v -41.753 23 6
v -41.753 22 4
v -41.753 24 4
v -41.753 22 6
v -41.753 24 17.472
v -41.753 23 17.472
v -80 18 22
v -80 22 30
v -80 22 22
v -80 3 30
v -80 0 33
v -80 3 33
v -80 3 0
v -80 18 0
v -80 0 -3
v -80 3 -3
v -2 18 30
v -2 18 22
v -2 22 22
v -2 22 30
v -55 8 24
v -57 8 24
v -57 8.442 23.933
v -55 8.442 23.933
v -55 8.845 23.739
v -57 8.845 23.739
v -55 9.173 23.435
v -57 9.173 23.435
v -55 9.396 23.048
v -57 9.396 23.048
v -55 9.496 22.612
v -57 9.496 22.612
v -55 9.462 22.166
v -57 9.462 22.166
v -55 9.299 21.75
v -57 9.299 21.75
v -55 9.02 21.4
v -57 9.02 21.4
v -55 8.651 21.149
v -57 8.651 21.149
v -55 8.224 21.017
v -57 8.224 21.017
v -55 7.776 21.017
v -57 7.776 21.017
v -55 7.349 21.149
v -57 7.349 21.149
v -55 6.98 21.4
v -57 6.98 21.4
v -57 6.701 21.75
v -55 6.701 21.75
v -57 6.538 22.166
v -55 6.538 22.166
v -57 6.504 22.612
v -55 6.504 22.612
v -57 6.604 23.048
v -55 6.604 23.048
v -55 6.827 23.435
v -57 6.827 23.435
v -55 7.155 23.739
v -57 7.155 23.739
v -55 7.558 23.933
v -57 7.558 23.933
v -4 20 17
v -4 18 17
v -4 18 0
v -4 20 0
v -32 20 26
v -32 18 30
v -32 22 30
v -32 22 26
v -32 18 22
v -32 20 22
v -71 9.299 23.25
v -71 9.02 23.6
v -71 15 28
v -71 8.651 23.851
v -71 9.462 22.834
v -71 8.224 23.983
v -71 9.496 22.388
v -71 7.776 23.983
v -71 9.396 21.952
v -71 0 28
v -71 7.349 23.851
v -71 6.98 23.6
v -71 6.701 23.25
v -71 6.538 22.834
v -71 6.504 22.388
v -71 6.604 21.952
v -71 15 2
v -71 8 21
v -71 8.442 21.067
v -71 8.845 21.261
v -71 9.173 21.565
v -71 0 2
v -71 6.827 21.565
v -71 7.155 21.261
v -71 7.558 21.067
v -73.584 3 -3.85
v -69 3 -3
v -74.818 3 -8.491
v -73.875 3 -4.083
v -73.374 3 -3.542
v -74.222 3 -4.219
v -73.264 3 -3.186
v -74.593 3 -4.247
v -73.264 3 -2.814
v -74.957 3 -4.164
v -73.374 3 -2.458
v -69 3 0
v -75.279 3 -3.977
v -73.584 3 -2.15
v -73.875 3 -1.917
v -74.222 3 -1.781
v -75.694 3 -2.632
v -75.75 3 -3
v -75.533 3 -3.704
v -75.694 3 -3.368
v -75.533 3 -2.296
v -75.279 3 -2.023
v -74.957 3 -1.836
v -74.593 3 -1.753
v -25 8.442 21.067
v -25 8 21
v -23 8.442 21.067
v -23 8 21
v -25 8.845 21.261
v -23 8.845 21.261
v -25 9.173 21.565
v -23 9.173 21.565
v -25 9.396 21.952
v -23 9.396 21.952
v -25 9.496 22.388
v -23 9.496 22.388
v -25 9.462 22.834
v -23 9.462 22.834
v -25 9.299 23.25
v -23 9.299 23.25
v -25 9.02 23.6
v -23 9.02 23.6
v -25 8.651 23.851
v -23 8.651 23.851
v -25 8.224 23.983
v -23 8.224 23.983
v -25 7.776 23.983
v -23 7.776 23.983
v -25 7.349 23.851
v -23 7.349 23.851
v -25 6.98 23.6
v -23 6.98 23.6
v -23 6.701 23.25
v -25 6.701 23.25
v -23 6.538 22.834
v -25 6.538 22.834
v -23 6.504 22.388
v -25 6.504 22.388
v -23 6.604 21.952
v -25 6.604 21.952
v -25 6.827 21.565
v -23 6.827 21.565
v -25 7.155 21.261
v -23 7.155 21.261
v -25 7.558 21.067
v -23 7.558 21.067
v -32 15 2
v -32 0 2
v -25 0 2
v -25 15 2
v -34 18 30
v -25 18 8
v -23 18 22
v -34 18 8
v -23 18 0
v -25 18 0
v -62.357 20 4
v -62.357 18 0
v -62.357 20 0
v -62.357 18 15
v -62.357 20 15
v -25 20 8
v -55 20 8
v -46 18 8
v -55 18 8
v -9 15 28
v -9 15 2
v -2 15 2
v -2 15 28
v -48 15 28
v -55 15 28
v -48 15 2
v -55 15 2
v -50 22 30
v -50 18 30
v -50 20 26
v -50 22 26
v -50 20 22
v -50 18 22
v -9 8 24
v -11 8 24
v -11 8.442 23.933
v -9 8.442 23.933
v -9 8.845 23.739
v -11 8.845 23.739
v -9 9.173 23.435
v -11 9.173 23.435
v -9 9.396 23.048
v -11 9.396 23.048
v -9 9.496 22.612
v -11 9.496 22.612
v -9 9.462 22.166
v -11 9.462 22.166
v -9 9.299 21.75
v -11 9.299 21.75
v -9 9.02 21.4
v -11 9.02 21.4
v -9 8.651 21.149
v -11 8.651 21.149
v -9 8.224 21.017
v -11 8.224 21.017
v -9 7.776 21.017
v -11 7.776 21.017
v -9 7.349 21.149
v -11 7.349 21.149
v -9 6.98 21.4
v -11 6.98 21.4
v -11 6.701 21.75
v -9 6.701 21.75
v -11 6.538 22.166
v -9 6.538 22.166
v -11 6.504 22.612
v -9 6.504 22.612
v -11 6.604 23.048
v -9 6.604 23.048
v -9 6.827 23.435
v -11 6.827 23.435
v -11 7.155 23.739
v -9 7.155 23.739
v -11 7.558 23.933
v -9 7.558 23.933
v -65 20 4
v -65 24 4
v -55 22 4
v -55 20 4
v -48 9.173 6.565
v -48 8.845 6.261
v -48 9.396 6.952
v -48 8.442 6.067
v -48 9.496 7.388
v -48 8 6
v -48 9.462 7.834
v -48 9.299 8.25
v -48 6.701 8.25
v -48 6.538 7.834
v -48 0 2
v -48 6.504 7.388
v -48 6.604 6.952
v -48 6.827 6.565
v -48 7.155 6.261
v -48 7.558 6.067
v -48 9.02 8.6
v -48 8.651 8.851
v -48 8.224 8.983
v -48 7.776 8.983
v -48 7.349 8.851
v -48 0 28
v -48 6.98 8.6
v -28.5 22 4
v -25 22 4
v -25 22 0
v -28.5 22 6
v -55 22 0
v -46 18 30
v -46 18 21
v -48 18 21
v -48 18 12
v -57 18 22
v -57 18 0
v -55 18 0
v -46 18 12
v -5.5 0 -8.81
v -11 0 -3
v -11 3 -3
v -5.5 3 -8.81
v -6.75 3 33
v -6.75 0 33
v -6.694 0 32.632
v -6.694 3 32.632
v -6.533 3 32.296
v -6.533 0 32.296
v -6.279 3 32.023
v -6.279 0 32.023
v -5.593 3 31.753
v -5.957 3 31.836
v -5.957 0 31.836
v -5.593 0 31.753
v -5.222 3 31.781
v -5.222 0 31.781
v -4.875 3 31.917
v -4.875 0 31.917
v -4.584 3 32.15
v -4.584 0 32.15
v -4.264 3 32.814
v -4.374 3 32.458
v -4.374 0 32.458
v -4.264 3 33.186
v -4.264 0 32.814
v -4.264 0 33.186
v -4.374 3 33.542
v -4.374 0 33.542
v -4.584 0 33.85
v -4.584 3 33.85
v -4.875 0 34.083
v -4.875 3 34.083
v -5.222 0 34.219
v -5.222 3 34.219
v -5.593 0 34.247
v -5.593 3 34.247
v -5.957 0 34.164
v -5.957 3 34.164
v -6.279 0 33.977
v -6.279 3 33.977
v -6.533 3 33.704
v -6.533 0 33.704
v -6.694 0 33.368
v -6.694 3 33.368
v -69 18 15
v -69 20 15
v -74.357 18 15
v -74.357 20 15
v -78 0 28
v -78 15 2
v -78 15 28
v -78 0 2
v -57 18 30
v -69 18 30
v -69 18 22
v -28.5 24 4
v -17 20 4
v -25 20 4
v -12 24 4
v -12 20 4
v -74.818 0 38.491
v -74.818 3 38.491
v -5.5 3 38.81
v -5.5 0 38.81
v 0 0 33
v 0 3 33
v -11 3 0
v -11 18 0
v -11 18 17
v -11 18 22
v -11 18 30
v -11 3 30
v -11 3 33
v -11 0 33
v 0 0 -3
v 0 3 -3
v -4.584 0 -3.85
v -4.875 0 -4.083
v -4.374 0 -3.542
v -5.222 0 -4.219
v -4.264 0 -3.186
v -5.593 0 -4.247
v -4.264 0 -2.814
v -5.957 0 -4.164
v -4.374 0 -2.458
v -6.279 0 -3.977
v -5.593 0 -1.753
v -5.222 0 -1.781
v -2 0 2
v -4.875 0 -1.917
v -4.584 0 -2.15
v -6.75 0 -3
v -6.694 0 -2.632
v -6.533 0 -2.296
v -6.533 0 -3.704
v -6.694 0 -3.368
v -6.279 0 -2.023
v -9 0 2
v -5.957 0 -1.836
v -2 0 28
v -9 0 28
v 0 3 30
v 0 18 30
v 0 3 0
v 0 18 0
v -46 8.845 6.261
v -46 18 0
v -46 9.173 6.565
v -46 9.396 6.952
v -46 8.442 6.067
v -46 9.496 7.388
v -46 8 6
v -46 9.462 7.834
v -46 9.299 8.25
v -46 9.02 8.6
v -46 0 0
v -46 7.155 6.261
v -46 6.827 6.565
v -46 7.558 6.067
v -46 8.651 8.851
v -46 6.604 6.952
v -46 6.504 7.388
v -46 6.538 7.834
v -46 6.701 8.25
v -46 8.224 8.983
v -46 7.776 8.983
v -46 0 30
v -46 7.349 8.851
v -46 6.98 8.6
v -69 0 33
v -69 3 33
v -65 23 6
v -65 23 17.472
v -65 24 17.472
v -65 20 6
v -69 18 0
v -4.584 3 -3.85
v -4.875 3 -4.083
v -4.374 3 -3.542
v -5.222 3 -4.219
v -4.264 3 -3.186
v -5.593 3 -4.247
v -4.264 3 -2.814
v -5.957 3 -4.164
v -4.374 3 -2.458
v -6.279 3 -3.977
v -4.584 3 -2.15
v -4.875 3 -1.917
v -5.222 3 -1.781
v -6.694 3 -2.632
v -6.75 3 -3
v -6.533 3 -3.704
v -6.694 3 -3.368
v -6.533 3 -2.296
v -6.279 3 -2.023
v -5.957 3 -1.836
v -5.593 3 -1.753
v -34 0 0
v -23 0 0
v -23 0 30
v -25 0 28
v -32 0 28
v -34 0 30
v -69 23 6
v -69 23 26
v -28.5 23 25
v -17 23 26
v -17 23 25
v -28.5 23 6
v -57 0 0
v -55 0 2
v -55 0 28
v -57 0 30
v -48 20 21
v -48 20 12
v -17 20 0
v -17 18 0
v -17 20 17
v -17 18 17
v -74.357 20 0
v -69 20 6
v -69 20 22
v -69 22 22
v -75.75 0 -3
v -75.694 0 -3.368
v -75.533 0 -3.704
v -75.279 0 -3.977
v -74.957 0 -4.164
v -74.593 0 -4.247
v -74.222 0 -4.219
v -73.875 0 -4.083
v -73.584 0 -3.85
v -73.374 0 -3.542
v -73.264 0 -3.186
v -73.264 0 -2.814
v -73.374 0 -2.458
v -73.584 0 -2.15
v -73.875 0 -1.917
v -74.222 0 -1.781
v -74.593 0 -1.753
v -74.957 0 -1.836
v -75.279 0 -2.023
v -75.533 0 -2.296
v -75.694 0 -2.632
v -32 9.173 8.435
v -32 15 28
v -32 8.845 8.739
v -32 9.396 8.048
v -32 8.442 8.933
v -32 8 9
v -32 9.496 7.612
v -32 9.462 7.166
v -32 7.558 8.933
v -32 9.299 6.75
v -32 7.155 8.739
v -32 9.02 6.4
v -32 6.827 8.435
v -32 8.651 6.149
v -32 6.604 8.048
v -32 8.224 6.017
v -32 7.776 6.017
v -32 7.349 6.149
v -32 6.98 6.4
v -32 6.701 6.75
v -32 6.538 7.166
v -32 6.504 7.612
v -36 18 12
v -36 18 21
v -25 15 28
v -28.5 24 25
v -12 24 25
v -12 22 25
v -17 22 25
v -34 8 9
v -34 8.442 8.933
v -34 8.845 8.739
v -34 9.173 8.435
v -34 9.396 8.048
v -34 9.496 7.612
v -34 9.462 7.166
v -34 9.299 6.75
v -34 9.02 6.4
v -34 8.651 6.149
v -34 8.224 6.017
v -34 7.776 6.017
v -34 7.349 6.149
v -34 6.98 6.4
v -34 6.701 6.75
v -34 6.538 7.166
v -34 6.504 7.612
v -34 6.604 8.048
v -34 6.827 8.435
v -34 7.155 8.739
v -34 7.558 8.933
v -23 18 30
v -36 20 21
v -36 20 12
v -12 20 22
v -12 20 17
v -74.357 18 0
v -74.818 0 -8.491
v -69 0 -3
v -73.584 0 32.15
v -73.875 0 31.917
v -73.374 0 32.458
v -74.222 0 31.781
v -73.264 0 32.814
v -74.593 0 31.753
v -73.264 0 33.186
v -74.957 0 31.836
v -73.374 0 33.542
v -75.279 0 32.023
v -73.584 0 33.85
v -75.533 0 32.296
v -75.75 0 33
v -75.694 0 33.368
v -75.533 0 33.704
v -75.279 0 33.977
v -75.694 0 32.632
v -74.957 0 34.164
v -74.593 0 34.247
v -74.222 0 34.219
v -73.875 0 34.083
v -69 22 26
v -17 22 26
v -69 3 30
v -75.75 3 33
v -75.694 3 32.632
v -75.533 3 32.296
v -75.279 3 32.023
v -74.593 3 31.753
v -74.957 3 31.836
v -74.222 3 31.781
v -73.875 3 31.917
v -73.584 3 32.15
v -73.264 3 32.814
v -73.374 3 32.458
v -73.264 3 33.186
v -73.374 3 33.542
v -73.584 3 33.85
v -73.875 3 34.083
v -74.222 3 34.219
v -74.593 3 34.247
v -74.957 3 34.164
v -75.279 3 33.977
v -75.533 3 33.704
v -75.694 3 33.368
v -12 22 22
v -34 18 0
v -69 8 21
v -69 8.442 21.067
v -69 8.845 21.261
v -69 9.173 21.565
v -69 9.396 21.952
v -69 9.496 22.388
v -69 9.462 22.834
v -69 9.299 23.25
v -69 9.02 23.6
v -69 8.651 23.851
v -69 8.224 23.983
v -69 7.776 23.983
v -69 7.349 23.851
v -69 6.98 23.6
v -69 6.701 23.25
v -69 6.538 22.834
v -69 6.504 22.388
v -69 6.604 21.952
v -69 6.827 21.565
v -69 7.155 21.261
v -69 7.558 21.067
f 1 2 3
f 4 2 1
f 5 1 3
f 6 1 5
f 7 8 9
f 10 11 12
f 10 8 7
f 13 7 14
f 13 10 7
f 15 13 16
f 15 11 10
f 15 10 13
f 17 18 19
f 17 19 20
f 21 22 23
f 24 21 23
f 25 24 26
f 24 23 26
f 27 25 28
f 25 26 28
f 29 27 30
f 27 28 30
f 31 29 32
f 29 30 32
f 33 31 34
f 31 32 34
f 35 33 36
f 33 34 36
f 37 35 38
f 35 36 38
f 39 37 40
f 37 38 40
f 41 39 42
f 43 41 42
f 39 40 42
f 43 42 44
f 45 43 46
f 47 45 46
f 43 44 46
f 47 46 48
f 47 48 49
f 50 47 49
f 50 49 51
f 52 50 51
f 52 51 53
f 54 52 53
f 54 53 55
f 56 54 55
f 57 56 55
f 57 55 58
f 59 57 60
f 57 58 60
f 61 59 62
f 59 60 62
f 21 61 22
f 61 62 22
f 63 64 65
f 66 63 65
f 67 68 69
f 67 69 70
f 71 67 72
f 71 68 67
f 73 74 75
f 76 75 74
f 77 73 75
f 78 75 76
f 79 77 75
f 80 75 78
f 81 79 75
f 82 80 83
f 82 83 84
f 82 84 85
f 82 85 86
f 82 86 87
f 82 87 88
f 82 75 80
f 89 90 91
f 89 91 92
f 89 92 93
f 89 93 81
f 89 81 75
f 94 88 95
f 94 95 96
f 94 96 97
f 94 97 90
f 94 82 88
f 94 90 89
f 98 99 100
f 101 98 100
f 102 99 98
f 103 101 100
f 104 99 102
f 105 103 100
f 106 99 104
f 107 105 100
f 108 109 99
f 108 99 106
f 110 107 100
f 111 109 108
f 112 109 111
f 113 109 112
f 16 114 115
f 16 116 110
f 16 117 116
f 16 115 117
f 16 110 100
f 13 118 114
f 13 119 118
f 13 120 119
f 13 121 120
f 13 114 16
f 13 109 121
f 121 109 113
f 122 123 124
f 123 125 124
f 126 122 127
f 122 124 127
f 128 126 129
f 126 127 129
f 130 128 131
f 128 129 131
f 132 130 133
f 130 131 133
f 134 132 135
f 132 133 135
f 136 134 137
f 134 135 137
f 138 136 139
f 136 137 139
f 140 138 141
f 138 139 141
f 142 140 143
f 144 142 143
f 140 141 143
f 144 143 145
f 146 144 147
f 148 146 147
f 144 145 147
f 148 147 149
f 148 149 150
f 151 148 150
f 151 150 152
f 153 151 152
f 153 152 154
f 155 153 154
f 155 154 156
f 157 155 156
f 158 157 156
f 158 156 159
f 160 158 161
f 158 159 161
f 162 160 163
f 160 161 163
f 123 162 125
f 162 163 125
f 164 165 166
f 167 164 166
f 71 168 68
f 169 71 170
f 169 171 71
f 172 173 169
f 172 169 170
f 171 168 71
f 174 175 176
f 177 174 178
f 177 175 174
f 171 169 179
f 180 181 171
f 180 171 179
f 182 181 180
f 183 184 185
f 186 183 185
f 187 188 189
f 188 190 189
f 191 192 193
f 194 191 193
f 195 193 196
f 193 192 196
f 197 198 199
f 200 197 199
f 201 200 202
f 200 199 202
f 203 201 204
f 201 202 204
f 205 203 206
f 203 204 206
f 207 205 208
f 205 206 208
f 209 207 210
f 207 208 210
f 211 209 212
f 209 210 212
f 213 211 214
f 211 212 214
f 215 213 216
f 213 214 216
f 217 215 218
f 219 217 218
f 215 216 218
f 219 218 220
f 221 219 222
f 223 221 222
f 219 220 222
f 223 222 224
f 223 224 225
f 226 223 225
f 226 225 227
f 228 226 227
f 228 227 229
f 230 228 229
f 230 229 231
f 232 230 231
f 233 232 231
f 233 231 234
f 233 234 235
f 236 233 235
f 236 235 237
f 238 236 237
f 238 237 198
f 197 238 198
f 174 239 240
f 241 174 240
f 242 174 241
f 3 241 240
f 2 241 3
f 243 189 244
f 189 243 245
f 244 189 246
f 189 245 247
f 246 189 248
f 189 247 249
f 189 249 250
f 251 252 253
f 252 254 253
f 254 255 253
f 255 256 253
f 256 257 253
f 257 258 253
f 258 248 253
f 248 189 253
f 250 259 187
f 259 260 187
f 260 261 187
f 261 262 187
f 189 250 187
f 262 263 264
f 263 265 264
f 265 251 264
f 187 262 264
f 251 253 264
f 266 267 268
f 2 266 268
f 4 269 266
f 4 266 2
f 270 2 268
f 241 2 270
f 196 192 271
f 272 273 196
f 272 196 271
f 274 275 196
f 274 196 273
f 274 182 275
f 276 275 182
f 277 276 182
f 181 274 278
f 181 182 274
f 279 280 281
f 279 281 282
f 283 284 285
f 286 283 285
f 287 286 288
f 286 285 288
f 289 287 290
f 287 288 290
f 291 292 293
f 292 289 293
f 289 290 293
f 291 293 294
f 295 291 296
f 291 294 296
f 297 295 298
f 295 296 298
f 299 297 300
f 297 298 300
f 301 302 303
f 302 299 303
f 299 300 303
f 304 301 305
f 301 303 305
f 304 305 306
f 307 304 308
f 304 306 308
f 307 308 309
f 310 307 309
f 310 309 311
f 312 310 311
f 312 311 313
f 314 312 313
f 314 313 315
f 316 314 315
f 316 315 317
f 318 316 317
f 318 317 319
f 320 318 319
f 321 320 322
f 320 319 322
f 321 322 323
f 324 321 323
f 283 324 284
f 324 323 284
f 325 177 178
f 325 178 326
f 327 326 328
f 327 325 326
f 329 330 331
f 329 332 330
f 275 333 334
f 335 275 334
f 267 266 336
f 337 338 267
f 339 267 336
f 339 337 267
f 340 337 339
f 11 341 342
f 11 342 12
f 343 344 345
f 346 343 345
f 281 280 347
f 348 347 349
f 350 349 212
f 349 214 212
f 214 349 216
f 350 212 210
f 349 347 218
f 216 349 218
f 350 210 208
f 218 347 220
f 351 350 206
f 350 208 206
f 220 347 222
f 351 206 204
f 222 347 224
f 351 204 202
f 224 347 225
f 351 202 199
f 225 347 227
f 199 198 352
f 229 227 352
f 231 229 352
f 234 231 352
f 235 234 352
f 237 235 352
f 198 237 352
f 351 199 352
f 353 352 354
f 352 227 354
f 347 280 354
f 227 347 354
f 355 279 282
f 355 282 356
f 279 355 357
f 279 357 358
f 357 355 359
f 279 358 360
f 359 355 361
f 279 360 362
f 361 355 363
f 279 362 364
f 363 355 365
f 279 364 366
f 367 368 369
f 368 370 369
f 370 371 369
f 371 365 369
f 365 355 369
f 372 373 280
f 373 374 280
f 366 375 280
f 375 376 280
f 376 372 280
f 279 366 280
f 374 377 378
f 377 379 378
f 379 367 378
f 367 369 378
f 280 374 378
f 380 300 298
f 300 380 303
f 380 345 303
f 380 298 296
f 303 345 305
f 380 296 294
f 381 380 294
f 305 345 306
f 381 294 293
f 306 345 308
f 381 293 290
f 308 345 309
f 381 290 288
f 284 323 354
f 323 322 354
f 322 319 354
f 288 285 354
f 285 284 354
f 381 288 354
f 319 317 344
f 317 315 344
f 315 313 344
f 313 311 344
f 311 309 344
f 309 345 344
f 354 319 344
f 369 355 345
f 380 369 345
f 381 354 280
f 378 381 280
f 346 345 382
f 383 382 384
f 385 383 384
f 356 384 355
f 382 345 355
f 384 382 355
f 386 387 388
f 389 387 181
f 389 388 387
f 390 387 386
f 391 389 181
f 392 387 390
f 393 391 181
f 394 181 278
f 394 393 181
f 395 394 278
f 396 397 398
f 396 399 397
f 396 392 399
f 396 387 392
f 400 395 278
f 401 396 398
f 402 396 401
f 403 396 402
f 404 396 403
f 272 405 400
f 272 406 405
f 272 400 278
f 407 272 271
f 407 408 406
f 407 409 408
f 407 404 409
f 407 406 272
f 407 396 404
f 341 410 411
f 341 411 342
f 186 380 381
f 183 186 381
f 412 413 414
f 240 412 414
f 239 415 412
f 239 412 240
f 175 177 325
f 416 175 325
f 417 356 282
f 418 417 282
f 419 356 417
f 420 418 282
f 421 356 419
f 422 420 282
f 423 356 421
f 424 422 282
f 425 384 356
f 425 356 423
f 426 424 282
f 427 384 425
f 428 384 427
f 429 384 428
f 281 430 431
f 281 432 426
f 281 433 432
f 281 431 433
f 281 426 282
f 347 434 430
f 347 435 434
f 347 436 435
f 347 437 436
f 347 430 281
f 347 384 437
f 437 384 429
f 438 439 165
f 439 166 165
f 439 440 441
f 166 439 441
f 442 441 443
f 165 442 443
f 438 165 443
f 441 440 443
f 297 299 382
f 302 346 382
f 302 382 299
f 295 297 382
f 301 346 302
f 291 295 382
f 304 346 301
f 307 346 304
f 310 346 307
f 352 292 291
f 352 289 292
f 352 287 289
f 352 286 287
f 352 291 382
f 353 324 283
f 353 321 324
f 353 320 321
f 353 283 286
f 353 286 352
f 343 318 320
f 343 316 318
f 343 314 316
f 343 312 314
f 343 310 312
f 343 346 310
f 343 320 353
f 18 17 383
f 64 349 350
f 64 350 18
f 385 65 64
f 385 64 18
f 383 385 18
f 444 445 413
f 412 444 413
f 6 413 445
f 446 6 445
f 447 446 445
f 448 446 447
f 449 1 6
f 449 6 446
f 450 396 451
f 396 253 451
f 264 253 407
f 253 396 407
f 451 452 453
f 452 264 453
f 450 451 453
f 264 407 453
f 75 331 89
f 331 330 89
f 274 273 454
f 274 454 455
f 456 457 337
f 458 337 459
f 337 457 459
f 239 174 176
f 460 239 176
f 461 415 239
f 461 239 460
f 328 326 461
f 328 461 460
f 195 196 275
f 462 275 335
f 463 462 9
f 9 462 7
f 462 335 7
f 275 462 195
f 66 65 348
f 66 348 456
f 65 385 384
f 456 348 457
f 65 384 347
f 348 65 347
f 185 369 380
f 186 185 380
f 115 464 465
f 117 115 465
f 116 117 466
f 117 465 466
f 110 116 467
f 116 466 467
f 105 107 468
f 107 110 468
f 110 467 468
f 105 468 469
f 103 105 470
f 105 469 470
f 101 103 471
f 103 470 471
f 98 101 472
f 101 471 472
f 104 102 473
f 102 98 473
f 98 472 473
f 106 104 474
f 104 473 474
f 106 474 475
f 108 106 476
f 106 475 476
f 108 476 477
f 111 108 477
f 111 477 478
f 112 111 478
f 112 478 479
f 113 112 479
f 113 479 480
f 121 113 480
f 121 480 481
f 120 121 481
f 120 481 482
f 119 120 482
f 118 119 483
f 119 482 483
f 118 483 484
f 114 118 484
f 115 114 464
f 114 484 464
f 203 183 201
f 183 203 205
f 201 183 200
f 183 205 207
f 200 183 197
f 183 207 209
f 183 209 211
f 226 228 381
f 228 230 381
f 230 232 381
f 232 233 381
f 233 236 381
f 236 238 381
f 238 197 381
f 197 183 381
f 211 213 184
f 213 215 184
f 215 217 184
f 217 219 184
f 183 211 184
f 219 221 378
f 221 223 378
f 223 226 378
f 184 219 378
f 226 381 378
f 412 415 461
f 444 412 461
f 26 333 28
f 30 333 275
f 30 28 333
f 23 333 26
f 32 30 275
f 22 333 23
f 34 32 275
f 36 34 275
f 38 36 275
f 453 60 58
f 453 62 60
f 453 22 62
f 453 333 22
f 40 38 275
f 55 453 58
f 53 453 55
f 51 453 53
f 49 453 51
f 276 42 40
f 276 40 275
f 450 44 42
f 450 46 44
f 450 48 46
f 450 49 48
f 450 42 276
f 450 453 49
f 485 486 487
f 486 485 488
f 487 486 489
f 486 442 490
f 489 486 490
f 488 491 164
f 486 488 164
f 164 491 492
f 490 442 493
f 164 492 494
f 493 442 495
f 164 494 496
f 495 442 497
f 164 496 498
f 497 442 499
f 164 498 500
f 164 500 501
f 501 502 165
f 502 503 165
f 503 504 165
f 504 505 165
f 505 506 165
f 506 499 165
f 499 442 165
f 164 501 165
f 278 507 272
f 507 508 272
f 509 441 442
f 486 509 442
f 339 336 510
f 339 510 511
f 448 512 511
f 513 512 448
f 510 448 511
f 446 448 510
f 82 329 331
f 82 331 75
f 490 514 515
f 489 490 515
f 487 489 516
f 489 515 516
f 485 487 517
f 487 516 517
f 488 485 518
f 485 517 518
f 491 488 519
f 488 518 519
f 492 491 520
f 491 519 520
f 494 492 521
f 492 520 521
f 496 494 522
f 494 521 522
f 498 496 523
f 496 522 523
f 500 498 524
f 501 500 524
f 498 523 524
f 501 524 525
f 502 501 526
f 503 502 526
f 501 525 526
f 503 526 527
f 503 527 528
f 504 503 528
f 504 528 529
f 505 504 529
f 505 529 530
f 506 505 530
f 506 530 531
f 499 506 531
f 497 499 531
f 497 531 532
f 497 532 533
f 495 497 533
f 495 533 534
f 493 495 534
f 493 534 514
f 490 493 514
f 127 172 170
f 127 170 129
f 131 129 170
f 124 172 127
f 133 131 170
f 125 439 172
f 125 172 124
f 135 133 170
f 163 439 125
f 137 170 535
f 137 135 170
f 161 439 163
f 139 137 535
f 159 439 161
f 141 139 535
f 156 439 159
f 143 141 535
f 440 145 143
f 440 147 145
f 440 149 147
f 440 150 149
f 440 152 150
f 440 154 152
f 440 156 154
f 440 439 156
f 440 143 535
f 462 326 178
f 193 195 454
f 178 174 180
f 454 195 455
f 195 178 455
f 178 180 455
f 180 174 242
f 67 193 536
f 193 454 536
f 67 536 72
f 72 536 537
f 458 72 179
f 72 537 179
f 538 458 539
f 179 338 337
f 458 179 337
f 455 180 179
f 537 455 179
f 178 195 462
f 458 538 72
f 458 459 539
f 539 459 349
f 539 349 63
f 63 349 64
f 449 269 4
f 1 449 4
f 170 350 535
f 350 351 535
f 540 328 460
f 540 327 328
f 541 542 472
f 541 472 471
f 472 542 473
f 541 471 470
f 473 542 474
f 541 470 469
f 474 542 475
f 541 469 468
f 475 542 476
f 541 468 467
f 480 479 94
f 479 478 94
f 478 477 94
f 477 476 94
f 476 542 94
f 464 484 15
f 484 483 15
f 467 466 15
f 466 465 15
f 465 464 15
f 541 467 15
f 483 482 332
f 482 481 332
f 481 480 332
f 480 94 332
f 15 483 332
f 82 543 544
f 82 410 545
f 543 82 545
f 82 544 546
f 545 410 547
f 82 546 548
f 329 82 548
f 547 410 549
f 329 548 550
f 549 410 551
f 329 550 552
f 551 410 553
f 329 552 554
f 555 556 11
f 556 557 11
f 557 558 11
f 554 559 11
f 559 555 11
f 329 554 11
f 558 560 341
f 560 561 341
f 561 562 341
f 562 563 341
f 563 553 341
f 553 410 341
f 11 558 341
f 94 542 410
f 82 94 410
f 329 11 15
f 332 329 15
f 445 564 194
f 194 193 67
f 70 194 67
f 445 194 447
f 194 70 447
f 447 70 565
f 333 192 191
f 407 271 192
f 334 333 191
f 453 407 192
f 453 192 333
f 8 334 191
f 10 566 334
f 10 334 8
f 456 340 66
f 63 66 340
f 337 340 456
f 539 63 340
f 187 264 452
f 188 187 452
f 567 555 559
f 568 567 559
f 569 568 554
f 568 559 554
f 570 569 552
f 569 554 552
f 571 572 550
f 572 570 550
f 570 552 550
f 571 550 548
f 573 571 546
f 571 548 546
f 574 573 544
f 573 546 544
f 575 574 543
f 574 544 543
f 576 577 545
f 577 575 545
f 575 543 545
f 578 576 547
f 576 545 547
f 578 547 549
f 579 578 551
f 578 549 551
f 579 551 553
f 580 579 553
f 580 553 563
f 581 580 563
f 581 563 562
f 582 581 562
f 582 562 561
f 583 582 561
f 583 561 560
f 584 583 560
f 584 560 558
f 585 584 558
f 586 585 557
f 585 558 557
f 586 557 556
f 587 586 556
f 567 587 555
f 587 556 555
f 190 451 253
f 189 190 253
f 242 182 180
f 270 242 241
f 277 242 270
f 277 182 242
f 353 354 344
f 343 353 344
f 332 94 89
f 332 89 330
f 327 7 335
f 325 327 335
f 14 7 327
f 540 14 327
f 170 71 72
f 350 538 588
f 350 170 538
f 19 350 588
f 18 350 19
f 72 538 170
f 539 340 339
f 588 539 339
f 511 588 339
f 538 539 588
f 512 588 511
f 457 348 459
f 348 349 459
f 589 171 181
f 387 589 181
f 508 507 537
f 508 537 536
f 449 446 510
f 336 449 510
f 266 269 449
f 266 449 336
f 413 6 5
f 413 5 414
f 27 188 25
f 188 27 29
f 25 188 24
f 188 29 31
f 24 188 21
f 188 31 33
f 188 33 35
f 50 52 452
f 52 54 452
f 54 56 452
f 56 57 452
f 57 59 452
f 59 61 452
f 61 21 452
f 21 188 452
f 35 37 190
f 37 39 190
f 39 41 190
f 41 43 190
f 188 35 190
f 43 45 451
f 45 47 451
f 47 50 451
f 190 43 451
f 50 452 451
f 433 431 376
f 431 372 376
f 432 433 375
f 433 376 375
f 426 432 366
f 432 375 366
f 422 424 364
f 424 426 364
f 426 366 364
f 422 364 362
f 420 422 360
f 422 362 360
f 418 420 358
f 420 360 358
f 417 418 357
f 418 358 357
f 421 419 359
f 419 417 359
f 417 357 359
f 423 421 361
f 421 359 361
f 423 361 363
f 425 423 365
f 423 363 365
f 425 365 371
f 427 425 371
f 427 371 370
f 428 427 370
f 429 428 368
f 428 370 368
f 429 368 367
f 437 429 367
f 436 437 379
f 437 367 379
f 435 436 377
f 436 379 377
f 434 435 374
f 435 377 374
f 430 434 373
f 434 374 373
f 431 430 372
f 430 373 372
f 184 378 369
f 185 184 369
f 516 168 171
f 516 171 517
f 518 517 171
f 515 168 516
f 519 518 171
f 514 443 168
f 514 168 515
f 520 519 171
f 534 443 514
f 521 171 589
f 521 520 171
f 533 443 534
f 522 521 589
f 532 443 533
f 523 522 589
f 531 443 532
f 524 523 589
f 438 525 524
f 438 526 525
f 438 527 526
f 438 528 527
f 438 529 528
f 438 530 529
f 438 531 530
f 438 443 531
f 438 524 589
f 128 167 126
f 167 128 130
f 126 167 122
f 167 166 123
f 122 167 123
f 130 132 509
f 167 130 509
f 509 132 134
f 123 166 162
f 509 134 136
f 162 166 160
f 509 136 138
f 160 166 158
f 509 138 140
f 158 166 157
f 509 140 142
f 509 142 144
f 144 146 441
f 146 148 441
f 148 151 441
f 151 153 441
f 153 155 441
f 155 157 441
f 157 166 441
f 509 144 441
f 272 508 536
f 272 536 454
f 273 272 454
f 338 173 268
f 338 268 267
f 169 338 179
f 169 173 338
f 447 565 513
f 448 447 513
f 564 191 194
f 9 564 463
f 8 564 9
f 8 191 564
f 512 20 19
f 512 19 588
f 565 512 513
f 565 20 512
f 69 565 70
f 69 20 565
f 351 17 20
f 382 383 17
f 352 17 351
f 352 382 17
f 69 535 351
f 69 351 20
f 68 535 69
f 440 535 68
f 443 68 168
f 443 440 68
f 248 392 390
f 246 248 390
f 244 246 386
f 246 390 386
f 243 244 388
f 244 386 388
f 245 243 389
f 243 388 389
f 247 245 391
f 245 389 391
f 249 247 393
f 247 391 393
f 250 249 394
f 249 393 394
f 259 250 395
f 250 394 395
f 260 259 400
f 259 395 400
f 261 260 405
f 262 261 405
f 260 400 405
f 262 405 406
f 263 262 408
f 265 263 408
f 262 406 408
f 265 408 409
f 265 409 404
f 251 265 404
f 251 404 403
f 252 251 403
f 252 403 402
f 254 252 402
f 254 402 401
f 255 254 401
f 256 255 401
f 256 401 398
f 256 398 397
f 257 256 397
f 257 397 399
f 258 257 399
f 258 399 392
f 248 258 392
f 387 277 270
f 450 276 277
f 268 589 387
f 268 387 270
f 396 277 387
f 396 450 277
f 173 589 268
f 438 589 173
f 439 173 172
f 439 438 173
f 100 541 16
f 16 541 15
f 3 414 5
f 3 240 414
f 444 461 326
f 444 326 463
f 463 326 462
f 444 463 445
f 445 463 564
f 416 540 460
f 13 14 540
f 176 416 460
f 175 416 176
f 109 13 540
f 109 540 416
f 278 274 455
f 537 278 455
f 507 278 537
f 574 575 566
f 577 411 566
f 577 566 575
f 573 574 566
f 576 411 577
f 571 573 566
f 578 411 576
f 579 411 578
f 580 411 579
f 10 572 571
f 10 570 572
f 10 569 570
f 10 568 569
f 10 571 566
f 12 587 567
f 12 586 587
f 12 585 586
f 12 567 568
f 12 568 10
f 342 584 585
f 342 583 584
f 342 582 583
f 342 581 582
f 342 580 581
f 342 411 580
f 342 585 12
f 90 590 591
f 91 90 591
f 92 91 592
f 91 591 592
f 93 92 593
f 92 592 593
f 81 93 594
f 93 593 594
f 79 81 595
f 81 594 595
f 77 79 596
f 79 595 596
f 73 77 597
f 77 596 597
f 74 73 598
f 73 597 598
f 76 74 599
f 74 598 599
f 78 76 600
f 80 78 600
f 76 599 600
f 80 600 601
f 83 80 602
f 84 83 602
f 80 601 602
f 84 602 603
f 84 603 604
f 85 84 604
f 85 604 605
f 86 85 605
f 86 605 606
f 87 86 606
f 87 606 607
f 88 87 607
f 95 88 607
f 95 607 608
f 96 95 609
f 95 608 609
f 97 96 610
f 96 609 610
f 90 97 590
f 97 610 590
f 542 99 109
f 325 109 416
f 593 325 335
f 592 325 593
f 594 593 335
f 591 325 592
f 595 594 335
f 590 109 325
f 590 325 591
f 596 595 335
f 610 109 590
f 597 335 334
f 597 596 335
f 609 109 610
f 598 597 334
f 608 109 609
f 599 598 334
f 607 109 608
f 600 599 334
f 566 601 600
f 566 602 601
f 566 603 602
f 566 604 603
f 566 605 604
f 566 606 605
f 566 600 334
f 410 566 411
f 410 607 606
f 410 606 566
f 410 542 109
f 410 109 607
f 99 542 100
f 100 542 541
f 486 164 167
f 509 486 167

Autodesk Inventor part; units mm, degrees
ref_plane "YZ Plane" through (0, 0, 0) normal (1, 0, 0) x (0, 1, 0)
ref_plane "XY Plane" through (0, 0, 0) normal (0, 0, 1) x (1, 0, 0)
sketch "Sketch1" plane through (0, 0, 0) normal (0, 1, 0) x (-1, 0, 0)
  line L0 (0, 0) -> (80, 0) construction
  line L1 (80, 0) -> (80, 30) construction
  line L2 (80, 30) -> (0, 30) construction
  line L3 (0, 30) -> (0, 0) construction
  dimension "d0" = 80
  dimension "d1" = 30
sketch "Sketch2" plane through (0, 0, 0) normal (0, 1, 0) x (-1, 0, 0)
  line L0 (80, 0) -> (69, 0)
  line L1 (69, 0) -> (69, 30)
  line L2 (69, 30) -> (80, 30)
  line L3 (80, 30) -> (80, 0)
  line L4 (0, 0) -> (11, 0)
  line L5 (11, 0) -> (11, 30)
  line L6 (11, 30) -> (0, 30)
  line L7 (0, 30) -> (0, 0)
  line L8 (57, 0) -> (46, 0)
  line L9 (46, 0) -> (46, 30)
  line L10 (46, 30) -> (57, 30)
  line L11 (57, 30) -> (57, 0)
  line L12 (34, 0) -> (23, 0)
  line L13 (23, 0) -> (23, 30)
  line L14 (23, 30) -> (34, 30)
  line L15 (34, 30) -> (34, 0)
  line L16 (69, 15) -> (57, 15) construction
  line L17 (46, 15) -> (34, 15) construction
  line L18 (23, 15) -> (11, 15) construction
  line L19 (71, 2) -> (78, 2)
  line L20 (78, 2) -> (78, 28)
  line L21 (78, 28) -> (71, 28)
  line L22 (71, 28) -> (71, 2)
  line L23 (55, 2) -> (48, 2)
  line L24 (48, 2) -> (48, 28)
  line L25 (48, 28) -> (55, 28)
  line L26 (55, 28) -> (55, 2)
  line L27 (32, 2) -> (25, 2)
  line L28 (25, 2) -> (25, 28)
  line L29 (25, 28) -> (32, 28)
  line L30 (32, 28) -> (32, 2)
  line L31 (9, 28) -> (9, 2)
  line L32 (9, 2) -> (2, 2)
  line L33 (2, 2) -> (2, 28)
  line L34 (2, 28) -> (9, 28)
  dimension "d2" = 11
  dimension "d3" = 30
  dimension "d4" = 11
  dimension "d6" = 11
  dimension "d8" = 11
  dimension "d9" = 80
  dimension "d10" = 2
  dimension "d11" = 2
  dimension "d12" = 2
  dimension "d13" = 2
extrude "Extrusion1" add sketch "Sketch2" along normal blind 15
sketch "Sketch3" plane through (0, 15, 0) normal (0, 1, 0) x (1, 0, 0)
  line L0 (-69, 0) -> (-80, 0) projected
  line L1 (-80, 0) -> (-69, 0)
  line L2 (-69, 0) -> (-69, -30)
  line L3 (-69, -30) -> (-80, -30)
  line L4 (-80, -30) -> (-80, 0)
  line L5 (-57, 0) -> (-46, 0)
  line L6 (-46, 0) -> (-46, -30)
  line L7 (-46, -30) -> (-57, -30)
  line L8 (-57, -30) -> (-57, 0)
  line L9 (-34, 0) -> (-23, 0)
  line L10 (-23, 0) -> (-23, -30)
  line L11 (-23, -30) -> (-34, -30)
  line L12 (-34, -30) -> (-34, 0)
  line L13 (-11, 0) -> (0, 0)
  line L14 (0, 0) -> (0, -30)
  line L15 (0, -30) -> (-11, -30)
  line L16 (-11, -30) -> (-11, 0)
  dimension "d16" = 30
  dimension "d19" = 23
extrude "Extrusion2" add sketch "Sketch3" along normal blind 3
sketch "Sketch4" plane through (-69, 0, 30) normal (1, 0, 0) x (0, 0, -1)
  circle A0 centre (7.5, 8) radius 1.5
  line L0 (2, 0) -> (28, 0) projected
  line L1 (0, 0) -> (0, 18) construction
  dimension "d26" = 3
  dimension "d28" = 8
  dimension "d29" = 7.5
extrude "Extrusion3" cut sketch "Sketch4" against normal blind 3
sketch "Sketch5" plane through (-57, 0, 0) normal (-1, 0, 0) x (0, 0, 1)
  circle A0 centre (22.5, 8) radius 1.5
  line L0 (30, 0) -> (30, 18) projected
  line L1 (2, 0) -> (28, 0) projected
  point P0 (0, 0)
  dimension "d33" = 3
  dimension "d34" = 7.5
  dimension "d35" = 8
extrude "Extrusion4" cut sketch "Sketch5" against normal blind 3
sketch "Sketch6" plane through (-46, 0, 30) normal (1, 0, 0) x (0, 0, -1)
  circle A0 centre (22.5, 8) radius 1.5
  line L0 (30, 0) -> (30, 18) projected
  line L1 (2, 0) -> (28, 0) projected
  dimension "d38" = 3
  dimension "d39" = 7.5
  dimension "d40" = 8
sketch "Sketch7" plane through (-34, 0, 0) normal (-1, 0, 0) x (0, 0, 1)
  circle A0 centre (7.5, 8) radius 1.5
  line L0 (2, 0) -> (28, 0) projected
  line L1 (0, 0) -> (0, 18) projected
  dimension "d41" = 3
  dimension "d42" = 8
  dimension "d43" = 7.5
sketch "Sketch8" plane through (-23, 0, 30) normal (1, 0, 0) x (0, 0, -1)
  circle A0 centre (7.5, 8) radius 1.5
  line L0 (2, 0) -> (28, 0) projected
  line L1 (0, 0) -> (0, 18) projected
  point P0 (30, 0)
  dimension "d44" = 3
  dimension "d45" = 8
  dimension "d46" = 7.5
sketch "Sketch9" plane through (-11, 0, 0) normal (-1, 0, 0) x (0, 0, 1)
  point P0 (0, 0)
sketch "Sketch10" plane through (-11, 0, 0) normal (-1, 0, 0) x (0, 0, 1)
  circle A0 centre (22.5, 8) radius 1.5
  line L0 (30, 0) -> (30, 18) projected
  line L1 (2, 0) -> (28, 0) projected
  point P0 (0, 0)
  dimension "d47" = 3
  dimension "d48" = 7.5
  dimension "d49" = 8
extrude "Extrusion5" cut sketch "Sketch6" against normal blind 3
extrude "Extrusion6" cut sketch "Sketch7" against normal blind 3
extrude "Extrusion7" cut sketch "Sketch8" against normal blind 3
extrude "Extrusion8" cut sketch "Sketch10" against normal blind 3
ref_plane "Work Plane1" through (0, 18, 0) normal (0, 1, 0) x (-1, 0, 0)
sketch "Sketch12" plane through (0, 18, 0) normal (0, 1, 0) x (-1, 0, 0)
  line L0 (80, 30) -> (50, 30)
  line L1 (50, 30) -> (50, 22)
  line L2 (50, 22) -> (80, 22)
  line L3 (80, 22) -> (80, 30)
  line L4 (55, 0) -> (25, 0)
  line L5 (25, 0) -> (25, 8)
  line L6 (25, 8) -> (55, 8)
  line L7 (55, 8) -> (55, 0)
  line L8 (32, 2) -> (32, 28) projected
  line L9 (32, 22) -> (2, 22)
  line L10 (2, 22) -> (2, 30)
  line L11 (2, 30) -> (32, 30)
  line L12 (32, 30) -> (32, 22)
  point P0 (0, 0)
  dimension "d59" = 30
  dimension "d60" = 8
  dimension "d61" = 30
  dimension "d62" = 8
  dimension "d63" = 30
sketch "Sketch13" plane through (0, 18, 0) normal (0, 1, 0) x (-1, 0, 0)
  line L0 (74.3573, 0) -> (62.3573, 0)
  line L1 (62.3573, 0) -> (62.3573, 15)
  line L2 (62.3573, 15) -> (74.3573, 15)
  line L3 (74.3573, 15) -> (74.3573, 0)
  line L4 (48, 12) -> (36, 12)
  line L5 (36, 12) -> (36, 21)
  line L6 (36, 21) -> (48, 21)
  line L7 (48, 21) -> (48, 12)
  line L8 (0, 0) -> (11, 0) projected
  line L9 (4, 0) -> (17, 0)
  line L10 (17, 0) -> (17, 17)
  line L11 (17, 17) -> (4, 17)
  line L12 (4, 17) -> (4, 0)
  dimension "d64" = 12
  dimension "d65" = 15
  dimension "d66" = 12
  dimension "d67" = 13
  dimension "d68" = 17
extrude "Extrusion9" add sketch "Sketch13" along normal blind 2
extrude "Extrusion10" add sketch "Sketch12" along normal blind 4
sketch "Sketch14" plane through (0, 20, 0) normal (0, 1, 0) x (1, 0, 0)
  line L0 (-65, -4) -> (-41.7529, -4)
  line L1 (-41.7529, -4) -> (-41.7529, -17.4715)
  line L2 (-41.7529, -17.4715) -> (-65, -17.4715)
  line L3 (-65, -17.4715) -> (-65, -4)
  line L4 (-12, -25) -> (-28.5, -25)
  line L5 (-28.5, -25) -> (-28.5, -4)
  line L6 (-28.5, -4) -> (-12, -4)
  line L7 (-12, -4) -> (-12, -25)
  point P0 (0, 0)
  dimension "d73" = 16.5
extrude "Extrusion11" add sketch "Sketch14" along normal blind 4
sketch "Sketch15" plane through (0, 20, 0) normal (0, 1, 0) x (1, 0, 0)
  line L0 (-69, -30) -> (-69, -22) projected
  line L1 (-69, -26) -> (-17, -26)
  line L2 (-17, -26) -> (-17, -6)
  line L3 (-17, -6) -> (-69, -6)
  line L4 (-69, -6) -> (-69, -26)
  point P0 (0, 0)
  dimension "d76" = 52
  dimension "d77" = 20
extrude "Extrusion12" add sketch "Sketch15" along normal blind 3
sketch "Sketch16" plane through (0, 0, 0) normal (0, 1, 0) x (-1, 0, 0)
  line L0 (69, 30) -> (80, 30) projected
  line L1 (80, 30) -> (80, 33)
  line L2 (69, 30) -> (69, 33)
  line L3 (69, 33) -> (74.8182, 38.4908)
  line L4 (74.8182, 38.4908) -> (80, 33)
  circle A0 centre (74.5, 33) radius 1.25
  line L5 (74.5, 33) -> (80, 33) construction
  line L6 (74.5, 33) -> (69, 33) construction
  line L7 (11, 30) -> (11, 33)
  line L8 (0, 30) -> (0, 33)
  line L9 (11, 33) -> (5.5, 38.8095)
  line L10 (5.5, 38.8095) -> (0, 33)
  circle A1 centre (5.5, 33) radius 1.25
  line L11 (5.5, 33) -> (11, 33) construction
  line L12 (5.5, 33) -> (0, 33) construction
  line L13 (80, 15) -> (0, 15) construction
  line L14 (69, 0) -> (80, 0)
  line L15 (80, 0) -> (80, -3)
  line L16 (69, 0) -> (69, -3)
  line L17 (69, -3) -> (74.8182, -8.4908)
  line L18 (74.8182, -8.4908) -> (80, -3)
  circle A2 centre (74.5, -3) radius 1.25
  line L19 (74.5, -3) -> (80, -3) construction
  line L20 (74.5, -3) -> (69, -3) construction
  line L21 (11, 0) -> (11, -3)
  line L22 (0, 0) -> (0, -3)
  line L23 (11, -3) -> (5.5, -8.8095)
  line L24 (5.5, -8.8095) -> (0, -3)
  circle A3 centre (5.5, -3) radius 1.25
  line L25 (5.5, -3) -> (11, -3) construction
  line L26 (5.5, -3) -> (0, -3) construction
  line L27 (80, 0) -> (69, 0) projected
  line L28 (80, 0) -> (69, 0)
  line L29 (11, 0) -> (0, 0)
  line L30 (4, 0) -> (17, 0) projected
  line L31 (11, 30) -> (0, 30)
  dimension "d80" = 3
  dimension "d81" = 3
  dimension "d82" = 8
  dimension "d83" = 2.5
  dimension "d84" = 3
  dimension "d85" = 3
  dimension "d86" = 3
  dimension "d87" = 8
  dimension "d88" = 2.5
extrude "Extrusion14" add sketch "Sketch16" along normal blind 3
equation "\"d11\" = d10"
equation "\"d12\" = d10"
equation "\"d13\" = d10"
equation "\"d81\" = d80"
equation "\"d84\" = d81"
equation "\"d85\" = d86"
equation "\"d86\" = d84"
equation "\"d87\" = d82"
properties part number "ball-waterfall"
